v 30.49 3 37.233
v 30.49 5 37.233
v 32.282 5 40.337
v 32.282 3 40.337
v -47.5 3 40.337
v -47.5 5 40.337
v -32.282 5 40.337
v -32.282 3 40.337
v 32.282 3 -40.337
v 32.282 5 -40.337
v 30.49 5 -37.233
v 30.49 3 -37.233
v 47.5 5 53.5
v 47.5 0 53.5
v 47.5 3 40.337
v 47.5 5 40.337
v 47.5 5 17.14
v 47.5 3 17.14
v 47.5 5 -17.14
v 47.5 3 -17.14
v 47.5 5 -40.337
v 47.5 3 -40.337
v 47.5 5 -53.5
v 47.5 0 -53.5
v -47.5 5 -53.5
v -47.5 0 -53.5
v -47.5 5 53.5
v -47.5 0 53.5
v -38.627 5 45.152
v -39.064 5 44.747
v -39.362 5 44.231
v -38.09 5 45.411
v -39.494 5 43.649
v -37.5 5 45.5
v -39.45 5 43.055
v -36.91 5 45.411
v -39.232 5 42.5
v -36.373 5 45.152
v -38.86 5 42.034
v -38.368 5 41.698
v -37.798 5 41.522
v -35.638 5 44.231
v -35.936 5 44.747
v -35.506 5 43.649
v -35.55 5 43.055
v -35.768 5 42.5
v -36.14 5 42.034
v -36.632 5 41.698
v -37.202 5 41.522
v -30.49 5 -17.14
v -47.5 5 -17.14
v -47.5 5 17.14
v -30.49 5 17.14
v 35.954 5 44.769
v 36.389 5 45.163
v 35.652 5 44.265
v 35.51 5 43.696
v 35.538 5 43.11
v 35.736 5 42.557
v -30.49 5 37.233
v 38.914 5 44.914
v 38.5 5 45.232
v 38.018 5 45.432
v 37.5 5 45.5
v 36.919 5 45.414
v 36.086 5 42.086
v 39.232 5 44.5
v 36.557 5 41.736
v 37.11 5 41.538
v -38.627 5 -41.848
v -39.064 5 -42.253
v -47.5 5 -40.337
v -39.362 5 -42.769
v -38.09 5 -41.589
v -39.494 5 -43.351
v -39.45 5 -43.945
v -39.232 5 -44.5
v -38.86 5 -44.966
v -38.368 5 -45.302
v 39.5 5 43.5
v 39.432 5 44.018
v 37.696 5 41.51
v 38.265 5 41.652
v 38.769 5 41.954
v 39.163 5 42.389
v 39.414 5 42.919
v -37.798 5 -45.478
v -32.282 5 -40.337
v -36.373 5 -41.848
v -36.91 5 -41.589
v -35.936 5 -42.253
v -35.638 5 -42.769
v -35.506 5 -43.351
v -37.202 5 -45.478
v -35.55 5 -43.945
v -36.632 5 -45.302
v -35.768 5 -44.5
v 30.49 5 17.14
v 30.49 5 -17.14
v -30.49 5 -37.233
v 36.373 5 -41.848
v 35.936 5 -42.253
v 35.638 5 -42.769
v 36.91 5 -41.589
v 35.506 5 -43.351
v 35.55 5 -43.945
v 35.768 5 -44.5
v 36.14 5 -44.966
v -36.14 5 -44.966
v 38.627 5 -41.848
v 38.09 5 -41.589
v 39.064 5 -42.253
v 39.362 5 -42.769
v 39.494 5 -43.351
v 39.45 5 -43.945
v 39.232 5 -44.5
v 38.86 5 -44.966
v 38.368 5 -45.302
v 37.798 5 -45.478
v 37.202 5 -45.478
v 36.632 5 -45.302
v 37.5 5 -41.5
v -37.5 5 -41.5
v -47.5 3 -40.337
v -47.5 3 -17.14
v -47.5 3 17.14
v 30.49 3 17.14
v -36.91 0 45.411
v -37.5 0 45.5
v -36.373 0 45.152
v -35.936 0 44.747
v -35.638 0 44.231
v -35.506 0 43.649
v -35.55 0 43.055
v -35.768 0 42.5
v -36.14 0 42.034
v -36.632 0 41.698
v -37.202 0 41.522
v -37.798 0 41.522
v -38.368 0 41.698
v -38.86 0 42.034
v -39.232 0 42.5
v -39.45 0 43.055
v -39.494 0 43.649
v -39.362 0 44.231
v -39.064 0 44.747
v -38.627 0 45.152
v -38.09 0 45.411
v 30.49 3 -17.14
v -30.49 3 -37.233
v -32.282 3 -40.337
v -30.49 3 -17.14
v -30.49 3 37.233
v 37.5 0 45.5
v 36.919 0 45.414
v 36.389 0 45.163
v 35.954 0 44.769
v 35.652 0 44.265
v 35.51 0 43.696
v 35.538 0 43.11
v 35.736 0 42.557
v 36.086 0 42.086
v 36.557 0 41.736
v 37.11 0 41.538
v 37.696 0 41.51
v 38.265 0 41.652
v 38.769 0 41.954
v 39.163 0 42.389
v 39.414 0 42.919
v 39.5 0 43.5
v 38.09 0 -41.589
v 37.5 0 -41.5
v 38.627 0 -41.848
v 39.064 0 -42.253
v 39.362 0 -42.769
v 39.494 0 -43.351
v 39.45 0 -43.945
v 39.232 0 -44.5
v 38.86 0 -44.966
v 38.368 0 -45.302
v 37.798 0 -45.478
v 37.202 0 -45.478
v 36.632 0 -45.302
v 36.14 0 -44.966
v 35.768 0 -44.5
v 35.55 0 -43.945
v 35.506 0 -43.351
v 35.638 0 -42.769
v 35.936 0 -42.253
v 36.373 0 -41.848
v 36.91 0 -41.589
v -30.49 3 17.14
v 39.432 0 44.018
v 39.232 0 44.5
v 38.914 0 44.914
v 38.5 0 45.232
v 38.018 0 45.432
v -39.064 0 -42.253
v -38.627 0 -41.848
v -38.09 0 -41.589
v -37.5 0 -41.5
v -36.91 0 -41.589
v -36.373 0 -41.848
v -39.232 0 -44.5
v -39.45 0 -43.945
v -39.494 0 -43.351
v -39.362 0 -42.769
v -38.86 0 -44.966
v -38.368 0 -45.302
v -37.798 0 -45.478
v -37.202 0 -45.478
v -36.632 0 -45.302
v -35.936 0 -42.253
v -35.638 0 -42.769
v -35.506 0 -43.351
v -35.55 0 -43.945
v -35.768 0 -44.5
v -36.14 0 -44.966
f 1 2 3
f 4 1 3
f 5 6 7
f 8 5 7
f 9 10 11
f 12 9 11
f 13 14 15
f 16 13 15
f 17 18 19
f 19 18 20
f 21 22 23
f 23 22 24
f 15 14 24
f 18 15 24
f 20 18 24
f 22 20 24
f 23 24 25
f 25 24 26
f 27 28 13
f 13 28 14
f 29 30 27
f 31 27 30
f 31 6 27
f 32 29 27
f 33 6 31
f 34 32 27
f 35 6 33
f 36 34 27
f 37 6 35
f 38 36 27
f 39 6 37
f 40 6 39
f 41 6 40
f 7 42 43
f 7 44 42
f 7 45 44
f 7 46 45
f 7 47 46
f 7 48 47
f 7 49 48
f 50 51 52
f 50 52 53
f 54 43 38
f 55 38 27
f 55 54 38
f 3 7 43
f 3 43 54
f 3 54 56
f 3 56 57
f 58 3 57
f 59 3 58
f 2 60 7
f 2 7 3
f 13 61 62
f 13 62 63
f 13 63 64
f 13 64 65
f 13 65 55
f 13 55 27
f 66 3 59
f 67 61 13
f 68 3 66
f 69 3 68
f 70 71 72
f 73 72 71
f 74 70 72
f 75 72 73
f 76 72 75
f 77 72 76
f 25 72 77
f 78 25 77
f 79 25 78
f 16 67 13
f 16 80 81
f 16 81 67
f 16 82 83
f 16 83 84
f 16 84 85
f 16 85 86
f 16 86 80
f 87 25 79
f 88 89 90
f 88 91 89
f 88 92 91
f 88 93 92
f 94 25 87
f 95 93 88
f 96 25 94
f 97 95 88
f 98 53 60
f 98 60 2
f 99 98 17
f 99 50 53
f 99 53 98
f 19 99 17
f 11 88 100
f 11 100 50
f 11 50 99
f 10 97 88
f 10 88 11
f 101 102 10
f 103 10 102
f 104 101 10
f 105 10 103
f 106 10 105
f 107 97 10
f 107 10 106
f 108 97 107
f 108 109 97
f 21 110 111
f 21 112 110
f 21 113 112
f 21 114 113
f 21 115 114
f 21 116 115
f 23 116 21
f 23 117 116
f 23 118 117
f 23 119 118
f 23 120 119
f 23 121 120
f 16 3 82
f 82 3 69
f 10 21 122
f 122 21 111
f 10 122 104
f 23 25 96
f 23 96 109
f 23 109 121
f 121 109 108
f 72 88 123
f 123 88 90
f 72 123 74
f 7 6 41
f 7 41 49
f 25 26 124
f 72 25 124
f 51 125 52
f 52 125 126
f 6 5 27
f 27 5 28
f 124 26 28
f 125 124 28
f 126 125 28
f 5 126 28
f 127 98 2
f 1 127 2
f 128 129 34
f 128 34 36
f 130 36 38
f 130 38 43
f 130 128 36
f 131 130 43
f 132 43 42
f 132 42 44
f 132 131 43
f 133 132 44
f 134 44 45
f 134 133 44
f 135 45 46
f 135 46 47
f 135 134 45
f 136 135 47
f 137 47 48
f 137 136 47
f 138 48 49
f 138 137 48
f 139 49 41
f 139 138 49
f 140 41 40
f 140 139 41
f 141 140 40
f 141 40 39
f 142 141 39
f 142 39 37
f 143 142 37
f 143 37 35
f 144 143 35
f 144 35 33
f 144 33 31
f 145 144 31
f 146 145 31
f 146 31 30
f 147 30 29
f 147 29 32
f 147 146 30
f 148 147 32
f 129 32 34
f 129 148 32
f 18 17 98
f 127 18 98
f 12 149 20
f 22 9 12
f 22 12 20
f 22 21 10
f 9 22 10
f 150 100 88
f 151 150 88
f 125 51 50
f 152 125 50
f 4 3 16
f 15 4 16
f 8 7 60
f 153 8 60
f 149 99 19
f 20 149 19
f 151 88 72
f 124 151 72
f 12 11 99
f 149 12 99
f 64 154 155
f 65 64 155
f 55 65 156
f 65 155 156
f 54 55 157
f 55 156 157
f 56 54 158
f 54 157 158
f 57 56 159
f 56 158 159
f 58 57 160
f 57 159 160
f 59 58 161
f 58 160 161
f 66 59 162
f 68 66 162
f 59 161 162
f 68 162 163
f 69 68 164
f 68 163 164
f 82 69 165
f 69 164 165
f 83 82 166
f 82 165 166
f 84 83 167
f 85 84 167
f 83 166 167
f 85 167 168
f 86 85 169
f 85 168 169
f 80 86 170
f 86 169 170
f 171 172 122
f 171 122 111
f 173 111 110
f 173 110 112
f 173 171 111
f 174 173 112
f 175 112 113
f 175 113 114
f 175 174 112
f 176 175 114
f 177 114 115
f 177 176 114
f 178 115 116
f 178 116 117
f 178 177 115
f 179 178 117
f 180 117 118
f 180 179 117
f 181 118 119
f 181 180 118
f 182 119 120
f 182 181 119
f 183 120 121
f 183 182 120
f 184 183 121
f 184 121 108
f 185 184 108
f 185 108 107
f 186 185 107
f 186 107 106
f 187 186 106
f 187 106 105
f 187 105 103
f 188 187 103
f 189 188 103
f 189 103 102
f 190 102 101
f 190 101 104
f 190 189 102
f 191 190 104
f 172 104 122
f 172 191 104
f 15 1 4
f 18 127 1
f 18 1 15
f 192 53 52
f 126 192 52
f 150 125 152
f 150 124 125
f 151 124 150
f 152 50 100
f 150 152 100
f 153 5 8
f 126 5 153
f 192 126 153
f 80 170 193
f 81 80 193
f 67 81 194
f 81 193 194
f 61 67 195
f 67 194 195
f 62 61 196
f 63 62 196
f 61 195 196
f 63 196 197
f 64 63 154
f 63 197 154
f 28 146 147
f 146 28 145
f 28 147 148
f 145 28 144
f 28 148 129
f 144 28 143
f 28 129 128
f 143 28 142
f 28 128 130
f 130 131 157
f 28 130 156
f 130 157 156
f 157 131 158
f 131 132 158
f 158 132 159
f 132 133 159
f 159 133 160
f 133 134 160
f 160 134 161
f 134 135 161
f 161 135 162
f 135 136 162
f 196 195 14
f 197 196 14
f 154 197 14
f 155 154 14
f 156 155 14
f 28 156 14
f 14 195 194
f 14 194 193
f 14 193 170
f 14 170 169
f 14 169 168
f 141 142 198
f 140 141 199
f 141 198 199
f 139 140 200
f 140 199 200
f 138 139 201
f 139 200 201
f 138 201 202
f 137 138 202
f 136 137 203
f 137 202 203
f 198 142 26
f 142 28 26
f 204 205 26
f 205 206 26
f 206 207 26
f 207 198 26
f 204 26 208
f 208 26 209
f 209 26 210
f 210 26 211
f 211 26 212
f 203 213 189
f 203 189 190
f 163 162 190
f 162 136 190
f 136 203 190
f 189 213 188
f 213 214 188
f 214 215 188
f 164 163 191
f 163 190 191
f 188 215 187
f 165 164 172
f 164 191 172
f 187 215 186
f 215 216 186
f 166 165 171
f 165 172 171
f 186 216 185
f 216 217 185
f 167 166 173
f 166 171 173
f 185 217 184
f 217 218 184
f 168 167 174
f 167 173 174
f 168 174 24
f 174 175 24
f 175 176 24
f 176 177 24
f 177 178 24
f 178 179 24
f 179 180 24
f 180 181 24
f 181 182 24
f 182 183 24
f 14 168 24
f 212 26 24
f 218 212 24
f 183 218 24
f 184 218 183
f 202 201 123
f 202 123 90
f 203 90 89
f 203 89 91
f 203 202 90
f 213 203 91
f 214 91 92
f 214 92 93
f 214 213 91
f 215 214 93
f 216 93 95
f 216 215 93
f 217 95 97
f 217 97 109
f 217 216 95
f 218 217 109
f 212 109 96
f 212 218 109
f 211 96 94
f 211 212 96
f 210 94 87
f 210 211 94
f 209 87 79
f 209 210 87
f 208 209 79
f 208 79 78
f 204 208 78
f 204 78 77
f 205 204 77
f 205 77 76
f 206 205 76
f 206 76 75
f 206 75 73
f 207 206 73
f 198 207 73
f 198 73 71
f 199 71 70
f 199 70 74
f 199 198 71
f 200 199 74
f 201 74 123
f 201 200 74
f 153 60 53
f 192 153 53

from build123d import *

# Parameters (mm, degrees)
SKETCH2_R           = 2
BOSS_EXTRUDE1_DEPTH = 5
CUT_EXTRUDE1_DEPTH  = 2


with BuildPart() as part:
    # Sketch2 → Boss-Extrude1 (new body)
    # profile 1 of 2: a face of its own
    with BuildSketch(Plane(origin=(0, 0, 0), x_dir=(1, 0, 0), z_dir=(0, 1, 0))):
        with BuildLine():
            ThreePointArc((37.5, -45.5), (36.085786438, -42.085786438), (39.5, -43.5))
            Line((39.5, -43.5), (47.5, -43.5))
            Line((47.5, -43.5), (47.5, 53.5))
            Line((47.5, 53.5), (-47.5, 53.5))
            Line((-47.5, 53.5), (-47.5, -53.5))
            Line((-47.5, -53.5), (37.5, -53.5))
            Line((37.5, -53.5), (37.5, -45.5))
        make_face()
        with Locations(Location((-37.5, -43.5, 0), (0, 0, 270))):
            Circle(SKETCH2_R, mode=Mode.SUBTRACT)
        with Locations(Location((-37.5, 43.5, 0), (0, 0, 270))):
            Circle(SKETCH2_R, mode=Mode.SUBTRACT)
        with Locations(Location((37.5, 43.5, 0), (0, 0, 270))):
            Circle(SKETCH2_R, mode=Mode.SUBTRACT)
    # profile 2 of 2: a face of its own
    with BuildSketch(Plane(origin=(0, 0, 0), x_dir=(1, 0, 0), z_dir=(0, 1, 0))):
        with BuildLine():
            Line((47.5, -43.5), (39.5, -43.5))
            ThreePointArc((39.5, -43.5), (38.914213562, -44.914213562), (37.5, -45.5))
            Line((37.5, -45.5), (37.5, -53.5))
            Line((37.5, -53.5), (47.5, -53.5))
            Line((47.5, -53.5), (47.5, -43.5))
        make_face()
    extrude(amount=BOSS_EXTRUDE1_DEPTH)

    # Sketch3 → Cut-Extrude1 (cut)
    with BuildSketch(Plane(origin=(0, 5, 0), x_dir=(1, 0, 0), z_dir=(0, 1, 0))):
        Polygon((-47.5, 40.237063088), (-47.5, 17.240159463), (-47.5, 17.140159463), (-30.489963443, 17.140159463), (-30.489963443, 37.232769094), (-32.282228416, 40.337063088), (-47.5, 40.337063088), align=None)
        Polygon((47.5, 40.337063088), (32.282228416, 40.337063088), (30.489963443, 37.232769094), (30.489963443, 17.140159463), (47.5, 17.140159463), (47.5, 17.240159463), (47.5, 40.237063088), align=None)
        Polygon((47.5, -17.240159463), (47.5, -17.140159463), (30.489963443, -17.140159463), (30.489963443, -37.232769094), (32.282228416, -40.337063088), (47.5, -40.337063088), (47.5, -40.237063088), align=None)
        Polygon((-30.489963443, -17.140159463), (-47.5, -17.140159463), (-47.5, -17.240159463), (-47.5, -40.237063088), (-47.5, -40.337063088), (-32.282228416, -40.337063088), (-30.489963443, -37.232769094), align=None)
    extrude(amount=-CUT_EXTRUDE1_DEPTH, mode=Mode.SUBTRACT)


solid = part.part
